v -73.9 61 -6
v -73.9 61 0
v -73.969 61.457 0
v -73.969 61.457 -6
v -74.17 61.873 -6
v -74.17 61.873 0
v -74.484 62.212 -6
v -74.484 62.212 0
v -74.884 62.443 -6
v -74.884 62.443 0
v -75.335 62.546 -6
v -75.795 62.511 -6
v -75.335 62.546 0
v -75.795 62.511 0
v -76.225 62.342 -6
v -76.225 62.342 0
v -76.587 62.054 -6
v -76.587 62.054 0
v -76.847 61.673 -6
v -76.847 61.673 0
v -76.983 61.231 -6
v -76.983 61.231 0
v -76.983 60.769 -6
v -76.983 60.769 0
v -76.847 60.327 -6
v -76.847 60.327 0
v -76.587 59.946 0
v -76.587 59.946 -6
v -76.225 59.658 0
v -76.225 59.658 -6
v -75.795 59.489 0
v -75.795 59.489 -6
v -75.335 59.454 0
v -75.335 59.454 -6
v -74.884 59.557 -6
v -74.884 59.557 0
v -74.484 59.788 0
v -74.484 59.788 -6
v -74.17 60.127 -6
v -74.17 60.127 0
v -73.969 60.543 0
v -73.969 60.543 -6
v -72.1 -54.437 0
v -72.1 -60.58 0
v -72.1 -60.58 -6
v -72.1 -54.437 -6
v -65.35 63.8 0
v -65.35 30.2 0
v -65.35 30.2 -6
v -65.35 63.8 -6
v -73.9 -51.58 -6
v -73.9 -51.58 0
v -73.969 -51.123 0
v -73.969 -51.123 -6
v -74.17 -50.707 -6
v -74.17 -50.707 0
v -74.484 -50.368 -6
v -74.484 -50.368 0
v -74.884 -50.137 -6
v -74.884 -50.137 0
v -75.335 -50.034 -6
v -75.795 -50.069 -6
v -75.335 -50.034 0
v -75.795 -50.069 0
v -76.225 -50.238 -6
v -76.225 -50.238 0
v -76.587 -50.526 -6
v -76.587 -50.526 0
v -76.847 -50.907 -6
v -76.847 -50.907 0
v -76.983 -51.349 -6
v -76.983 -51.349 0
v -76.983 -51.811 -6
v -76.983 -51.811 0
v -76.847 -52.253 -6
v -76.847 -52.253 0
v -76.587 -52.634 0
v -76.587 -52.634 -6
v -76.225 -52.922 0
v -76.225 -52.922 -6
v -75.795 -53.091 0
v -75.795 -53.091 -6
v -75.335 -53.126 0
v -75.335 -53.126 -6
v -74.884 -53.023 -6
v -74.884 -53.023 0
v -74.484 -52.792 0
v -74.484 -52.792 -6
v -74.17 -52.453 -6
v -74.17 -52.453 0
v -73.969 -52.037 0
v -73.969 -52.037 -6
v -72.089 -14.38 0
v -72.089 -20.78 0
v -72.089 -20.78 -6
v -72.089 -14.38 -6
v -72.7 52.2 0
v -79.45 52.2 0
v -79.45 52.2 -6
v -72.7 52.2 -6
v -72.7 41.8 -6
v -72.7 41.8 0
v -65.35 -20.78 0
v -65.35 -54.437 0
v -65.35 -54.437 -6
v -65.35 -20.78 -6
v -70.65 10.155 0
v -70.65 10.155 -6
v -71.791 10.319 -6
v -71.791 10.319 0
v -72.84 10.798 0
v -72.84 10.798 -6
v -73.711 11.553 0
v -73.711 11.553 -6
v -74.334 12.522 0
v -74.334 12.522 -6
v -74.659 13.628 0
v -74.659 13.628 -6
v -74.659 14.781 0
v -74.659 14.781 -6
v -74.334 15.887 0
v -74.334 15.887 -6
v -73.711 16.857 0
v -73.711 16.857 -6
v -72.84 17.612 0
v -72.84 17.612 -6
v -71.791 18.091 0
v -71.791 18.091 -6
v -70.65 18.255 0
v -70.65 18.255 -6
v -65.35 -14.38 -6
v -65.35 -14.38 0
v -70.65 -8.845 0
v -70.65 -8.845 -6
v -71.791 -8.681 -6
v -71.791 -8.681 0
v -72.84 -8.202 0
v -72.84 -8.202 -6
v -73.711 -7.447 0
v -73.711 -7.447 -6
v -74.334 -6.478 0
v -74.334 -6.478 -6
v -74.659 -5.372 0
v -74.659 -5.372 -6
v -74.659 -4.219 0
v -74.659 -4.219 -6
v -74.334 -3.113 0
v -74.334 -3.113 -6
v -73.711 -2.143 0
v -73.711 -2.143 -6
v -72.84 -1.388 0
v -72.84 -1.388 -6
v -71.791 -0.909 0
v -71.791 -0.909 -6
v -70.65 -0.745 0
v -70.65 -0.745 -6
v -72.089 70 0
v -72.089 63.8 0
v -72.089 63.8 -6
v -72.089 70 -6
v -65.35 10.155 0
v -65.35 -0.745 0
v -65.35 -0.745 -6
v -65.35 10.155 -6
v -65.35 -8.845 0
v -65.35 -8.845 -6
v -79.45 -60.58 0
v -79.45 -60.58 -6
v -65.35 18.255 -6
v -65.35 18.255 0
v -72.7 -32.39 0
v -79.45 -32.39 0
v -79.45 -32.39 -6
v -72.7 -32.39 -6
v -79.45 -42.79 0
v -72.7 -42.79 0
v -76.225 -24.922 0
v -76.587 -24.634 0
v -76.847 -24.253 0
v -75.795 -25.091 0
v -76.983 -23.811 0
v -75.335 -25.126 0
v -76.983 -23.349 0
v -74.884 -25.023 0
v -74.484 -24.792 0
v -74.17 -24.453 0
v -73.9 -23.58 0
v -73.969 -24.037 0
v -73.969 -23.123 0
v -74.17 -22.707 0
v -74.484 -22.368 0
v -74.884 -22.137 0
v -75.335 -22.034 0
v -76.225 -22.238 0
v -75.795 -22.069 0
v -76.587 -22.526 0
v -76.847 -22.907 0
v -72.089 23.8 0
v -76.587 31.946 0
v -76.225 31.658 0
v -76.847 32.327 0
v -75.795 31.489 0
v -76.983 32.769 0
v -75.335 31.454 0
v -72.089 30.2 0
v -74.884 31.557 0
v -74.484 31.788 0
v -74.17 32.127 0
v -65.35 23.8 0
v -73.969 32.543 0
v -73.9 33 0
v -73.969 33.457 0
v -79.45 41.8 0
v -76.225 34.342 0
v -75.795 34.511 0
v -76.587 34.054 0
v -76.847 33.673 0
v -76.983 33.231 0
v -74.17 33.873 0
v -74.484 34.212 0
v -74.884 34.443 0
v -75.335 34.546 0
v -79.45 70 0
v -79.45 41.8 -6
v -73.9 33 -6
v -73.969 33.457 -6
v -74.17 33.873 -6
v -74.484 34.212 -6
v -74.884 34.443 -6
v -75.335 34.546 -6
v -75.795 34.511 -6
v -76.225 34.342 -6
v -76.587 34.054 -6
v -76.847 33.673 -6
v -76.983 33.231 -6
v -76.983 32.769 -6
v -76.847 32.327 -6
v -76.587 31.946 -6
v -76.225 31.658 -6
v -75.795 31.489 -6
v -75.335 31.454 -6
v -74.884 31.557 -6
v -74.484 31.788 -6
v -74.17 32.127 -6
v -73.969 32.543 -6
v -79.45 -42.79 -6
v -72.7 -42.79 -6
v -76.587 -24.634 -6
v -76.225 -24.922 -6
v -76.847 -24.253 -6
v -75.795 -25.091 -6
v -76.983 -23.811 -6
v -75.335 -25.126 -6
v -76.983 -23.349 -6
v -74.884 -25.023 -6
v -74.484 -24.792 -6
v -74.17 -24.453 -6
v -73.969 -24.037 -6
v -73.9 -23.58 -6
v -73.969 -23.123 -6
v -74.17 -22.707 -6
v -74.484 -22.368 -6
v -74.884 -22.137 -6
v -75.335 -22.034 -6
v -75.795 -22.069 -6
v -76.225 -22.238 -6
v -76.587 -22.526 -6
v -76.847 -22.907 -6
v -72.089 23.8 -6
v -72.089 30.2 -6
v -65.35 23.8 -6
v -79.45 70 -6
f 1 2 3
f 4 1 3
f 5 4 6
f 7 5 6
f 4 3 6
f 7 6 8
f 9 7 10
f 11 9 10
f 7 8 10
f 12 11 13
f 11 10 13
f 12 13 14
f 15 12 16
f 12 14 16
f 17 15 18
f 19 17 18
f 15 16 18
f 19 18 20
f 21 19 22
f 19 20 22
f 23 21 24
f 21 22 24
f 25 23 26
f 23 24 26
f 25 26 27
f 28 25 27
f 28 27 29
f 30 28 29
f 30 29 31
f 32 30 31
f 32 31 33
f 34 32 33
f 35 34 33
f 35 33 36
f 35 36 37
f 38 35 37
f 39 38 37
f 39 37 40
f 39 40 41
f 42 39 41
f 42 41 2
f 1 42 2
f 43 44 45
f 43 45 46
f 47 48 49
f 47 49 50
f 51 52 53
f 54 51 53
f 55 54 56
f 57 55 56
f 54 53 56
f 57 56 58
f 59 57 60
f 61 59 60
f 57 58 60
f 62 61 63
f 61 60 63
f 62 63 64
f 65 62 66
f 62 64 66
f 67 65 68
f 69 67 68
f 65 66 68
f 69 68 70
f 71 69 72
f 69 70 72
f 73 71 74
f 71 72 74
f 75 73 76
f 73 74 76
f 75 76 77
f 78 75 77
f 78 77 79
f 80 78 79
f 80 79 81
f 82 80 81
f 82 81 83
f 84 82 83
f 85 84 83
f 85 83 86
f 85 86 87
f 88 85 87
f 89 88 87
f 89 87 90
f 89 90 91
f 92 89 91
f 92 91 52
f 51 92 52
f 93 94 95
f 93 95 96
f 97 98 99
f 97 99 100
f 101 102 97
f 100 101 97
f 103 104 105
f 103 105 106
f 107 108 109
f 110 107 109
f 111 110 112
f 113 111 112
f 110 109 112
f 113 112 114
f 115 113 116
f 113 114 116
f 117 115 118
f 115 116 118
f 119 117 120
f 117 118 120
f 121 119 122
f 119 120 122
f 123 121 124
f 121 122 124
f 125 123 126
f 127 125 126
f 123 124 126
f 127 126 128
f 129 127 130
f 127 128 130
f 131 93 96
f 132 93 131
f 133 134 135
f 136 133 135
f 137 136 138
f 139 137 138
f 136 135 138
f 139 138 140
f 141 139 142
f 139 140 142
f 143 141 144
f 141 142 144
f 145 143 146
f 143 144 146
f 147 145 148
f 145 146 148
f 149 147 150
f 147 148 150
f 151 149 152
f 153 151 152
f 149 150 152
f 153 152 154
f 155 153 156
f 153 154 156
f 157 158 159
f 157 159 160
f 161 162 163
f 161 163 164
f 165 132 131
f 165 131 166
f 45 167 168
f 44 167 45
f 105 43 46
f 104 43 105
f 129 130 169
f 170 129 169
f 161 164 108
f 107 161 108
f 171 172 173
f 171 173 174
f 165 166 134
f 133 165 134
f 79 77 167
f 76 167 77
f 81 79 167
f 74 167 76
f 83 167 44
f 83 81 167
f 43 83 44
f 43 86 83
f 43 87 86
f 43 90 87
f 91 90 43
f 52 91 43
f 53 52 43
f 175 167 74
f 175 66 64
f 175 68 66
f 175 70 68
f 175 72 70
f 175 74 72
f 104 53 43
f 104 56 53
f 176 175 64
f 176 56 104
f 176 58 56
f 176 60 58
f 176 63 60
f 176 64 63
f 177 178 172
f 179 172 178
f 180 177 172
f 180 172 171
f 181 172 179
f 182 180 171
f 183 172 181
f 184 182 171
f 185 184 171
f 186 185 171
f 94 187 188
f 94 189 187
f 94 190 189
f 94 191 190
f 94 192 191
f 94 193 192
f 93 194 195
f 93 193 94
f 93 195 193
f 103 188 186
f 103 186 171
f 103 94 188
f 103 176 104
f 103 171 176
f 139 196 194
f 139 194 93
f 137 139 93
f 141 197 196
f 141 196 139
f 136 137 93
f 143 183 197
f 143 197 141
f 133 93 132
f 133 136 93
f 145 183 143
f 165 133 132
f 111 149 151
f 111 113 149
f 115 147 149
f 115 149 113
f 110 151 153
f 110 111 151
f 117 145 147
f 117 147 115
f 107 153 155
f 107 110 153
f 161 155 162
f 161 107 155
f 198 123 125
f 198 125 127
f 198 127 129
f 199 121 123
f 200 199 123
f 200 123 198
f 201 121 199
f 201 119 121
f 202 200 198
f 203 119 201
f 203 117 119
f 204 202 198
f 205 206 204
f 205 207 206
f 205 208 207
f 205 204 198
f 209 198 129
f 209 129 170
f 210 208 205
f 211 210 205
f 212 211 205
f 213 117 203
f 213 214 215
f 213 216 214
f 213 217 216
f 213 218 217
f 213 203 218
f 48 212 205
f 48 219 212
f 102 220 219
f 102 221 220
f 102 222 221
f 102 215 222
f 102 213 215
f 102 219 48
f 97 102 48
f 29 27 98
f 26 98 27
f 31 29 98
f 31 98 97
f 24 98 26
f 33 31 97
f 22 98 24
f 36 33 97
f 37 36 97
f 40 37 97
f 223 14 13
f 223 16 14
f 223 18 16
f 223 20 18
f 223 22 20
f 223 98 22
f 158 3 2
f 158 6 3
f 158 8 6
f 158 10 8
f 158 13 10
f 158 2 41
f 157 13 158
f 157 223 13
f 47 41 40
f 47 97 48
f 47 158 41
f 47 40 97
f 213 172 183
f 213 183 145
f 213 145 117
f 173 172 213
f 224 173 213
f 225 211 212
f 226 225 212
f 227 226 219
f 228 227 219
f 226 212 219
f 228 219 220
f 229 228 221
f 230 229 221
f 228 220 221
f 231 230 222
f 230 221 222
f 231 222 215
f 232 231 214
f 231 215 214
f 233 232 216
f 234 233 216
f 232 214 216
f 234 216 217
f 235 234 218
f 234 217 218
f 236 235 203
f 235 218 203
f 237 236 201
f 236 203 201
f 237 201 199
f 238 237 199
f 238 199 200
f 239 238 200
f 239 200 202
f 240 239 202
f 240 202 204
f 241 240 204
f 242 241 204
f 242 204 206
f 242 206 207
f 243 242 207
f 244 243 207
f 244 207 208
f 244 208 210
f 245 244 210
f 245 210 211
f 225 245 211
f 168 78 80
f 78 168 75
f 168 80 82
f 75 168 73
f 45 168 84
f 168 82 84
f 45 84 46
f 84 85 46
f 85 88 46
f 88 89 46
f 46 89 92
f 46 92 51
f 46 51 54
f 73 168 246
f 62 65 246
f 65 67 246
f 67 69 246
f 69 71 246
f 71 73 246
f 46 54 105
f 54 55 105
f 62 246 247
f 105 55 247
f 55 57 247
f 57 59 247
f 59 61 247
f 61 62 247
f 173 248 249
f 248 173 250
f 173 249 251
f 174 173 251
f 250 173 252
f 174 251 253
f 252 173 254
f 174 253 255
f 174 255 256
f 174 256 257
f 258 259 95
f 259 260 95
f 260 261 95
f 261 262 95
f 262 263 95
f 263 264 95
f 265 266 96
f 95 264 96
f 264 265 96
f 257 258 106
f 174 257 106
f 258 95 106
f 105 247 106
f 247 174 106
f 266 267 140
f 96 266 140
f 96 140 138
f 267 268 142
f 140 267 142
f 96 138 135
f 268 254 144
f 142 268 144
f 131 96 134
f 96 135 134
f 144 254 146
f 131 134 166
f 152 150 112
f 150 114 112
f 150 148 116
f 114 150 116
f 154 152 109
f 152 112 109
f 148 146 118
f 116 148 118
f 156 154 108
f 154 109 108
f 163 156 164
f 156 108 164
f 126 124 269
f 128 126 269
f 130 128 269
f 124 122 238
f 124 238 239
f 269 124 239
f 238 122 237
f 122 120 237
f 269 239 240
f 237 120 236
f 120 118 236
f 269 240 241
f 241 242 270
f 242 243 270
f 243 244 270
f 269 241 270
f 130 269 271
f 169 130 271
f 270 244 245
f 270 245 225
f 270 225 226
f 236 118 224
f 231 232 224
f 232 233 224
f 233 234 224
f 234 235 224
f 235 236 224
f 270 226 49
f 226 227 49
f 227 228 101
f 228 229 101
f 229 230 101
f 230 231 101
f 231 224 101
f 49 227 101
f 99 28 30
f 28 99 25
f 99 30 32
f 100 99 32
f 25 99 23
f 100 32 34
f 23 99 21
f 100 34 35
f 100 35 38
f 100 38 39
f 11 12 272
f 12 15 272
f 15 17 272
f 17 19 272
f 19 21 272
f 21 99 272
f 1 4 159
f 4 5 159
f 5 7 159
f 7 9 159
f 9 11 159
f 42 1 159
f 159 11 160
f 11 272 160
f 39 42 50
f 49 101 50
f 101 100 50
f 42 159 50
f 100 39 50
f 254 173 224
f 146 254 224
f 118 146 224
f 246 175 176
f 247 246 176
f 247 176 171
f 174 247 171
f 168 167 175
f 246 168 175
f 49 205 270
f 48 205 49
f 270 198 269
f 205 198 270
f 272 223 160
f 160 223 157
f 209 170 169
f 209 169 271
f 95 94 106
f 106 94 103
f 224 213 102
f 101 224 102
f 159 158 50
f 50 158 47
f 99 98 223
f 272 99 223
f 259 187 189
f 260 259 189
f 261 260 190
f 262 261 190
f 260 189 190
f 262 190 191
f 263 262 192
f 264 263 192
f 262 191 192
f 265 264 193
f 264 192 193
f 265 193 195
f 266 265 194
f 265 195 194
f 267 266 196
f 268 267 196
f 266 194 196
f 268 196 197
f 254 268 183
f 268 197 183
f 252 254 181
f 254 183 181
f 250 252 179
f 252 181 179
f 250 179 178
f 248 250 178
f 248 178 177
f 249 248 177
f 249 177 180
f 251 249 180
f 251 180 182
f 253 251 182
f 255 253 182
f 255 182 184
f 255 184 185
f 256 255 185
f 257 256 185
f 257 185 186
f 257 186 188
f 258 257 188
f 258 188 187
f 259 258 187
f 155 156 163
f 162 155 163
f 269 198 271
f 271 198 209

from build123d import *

# Parameters (mm, degrees)
SZKIC1_W                    = 14.1
SZKIC1_H                    = 136.58
DODANIE_WYCI_GNI_CIE1_DEPTH = 6
PRZENIE_CIAN_1_BY           = 6
SZKIC3_W                    = 6.75
SZKIC3_H                    = 10.4
SZKIC3_W_2                  = 6.95
SZKIC3_H_2                  = 6.4
SZKIC3_H_3                  = 6.342942851
WYTNIJ_WYCI_GNI_CIE1_DEPTH  = 107.058352026
SZKIC4_R                    = 1.55
WYTNIJ_WYCI_GNI_CIE2_DEPTH  = 107.058352026
WYTNIJ_WYCI_GNI_CIE3_DEPTH  = 10


with BuildPart() as part:
    # Szkic1 → Dodanie-wyciągnięcie1 (new body)
    with BuildSketch(Plane.XY):
        with Locations((-72.400450183, 1.710000001)):
            Rectangle(SZKIC1_W, SZKIC1_H)
    extrude(amount=-DODANIE_WYCI_GNI_CIE1_DEPTH)

    # Przenieś ścianę1: a face moved inward by 6.0
    extrude(part.faces().sort_by_distance((-72.400450183, -66.579999999, -3))[0], amount=PRZENIE_CIAN_1_BY, dir=(0, 1, 0), mode=Mode.SUBTRACT)

    # Szkic3 → Wytnij-wyciągnięcie1 (cut, through all)
    with BuildSketch(Plane.XY):
        with Locations((-76.075450183, -37.590311709)):
            Rectangle(SZKIC3_W, SZKIC3_H)
        with Locations((-68.613894602, 67.000000001)):
            Rectangle(SZKIC3_W_2, SZKIC3_H_2)
        with Locations((-68.613894602, 27.000000001)):
            Rectangle(SZKIC3_W_2, SZKIC3_H_2)
        with Locations((-68.625450183, -57.608528574)):
            Rectangle(SZKIC3_W_2, SZKIC3_H_3)
        with Locations((-68.613894602, -17.579999999)):
            Rectangle(SZKIC3_W_2, SZKIC3_H_2)
        with Locations((-76.075450183, 47.000000001)):
            Rectangle(SZKIC3_W, SZKIC3_H)
    extrude(amount=-WYTNIJ_WYCI_GNI_CIE1_DEPTH, mode=Mode.SUBTRACT)

    # Szkic4 → Wytnij-wyciągnięcie2 (cut, through all)
    with BuildSketch(Plane.XY):
        with Locations((-75.450450183, 61.000000001)):
            Circle(SZKIC4_R)
        with Locations((-75.450450183, -51.579999999)):
            Circle(SZKIC4_R)
        with Locations((-75.450450183, 33.000000001)):
            Circle(SZKIC4_R)
        with Locations((-75.450450183, -23.579999999)):
            Circle(SZKIC4_R)
    extrude(amount=-WYTNIJ_WYCI_GNI_CIE2_DEPTH, mode=Mode.SUBTRACT)

    # Szkic5 → Wytnij-wyciągnięcie3 (cut)
    with BuildSketch(Plane(origin=(0, 0, -6), x_dir=(-1, 0, 0), z_dir=(0, 0, -1))):
        with BuildLine():
            Line((65.350450183, -0.745155849), (65.350450183, -8.845155849))
            Line((65.350450183, -8.845155849), (70.650450183, -8.845155849))
            ThreePointArc((70.650450183, -8.845155849), (74.700450183, -4.795155849), (70.650450183, -0.745155849))
            Line((70.650450183, -0.745155849), (65.350450183, -0.745155849))
        make_face()
        with BuildLine():
            Line((65.350450183, 10.154844151), (70.650450183, 10.154844151))
            ThreePointArc((70.650450183, 10.154844151), (74.700450183, 14.204844151), (70.650450183, 18.254844151))
            Line((70.650450183, 18.254844151), (65.350450183, 18.254844151))
            Line((65.350450183, 18.254844151), (65.350450183, 10.154844151))
        make_face()
    extrude(amount=-WYTNIJ_WYCI_GNI_CIE3_DEPTH, mode=Mode.SUBTRACT)


solid = part.part
